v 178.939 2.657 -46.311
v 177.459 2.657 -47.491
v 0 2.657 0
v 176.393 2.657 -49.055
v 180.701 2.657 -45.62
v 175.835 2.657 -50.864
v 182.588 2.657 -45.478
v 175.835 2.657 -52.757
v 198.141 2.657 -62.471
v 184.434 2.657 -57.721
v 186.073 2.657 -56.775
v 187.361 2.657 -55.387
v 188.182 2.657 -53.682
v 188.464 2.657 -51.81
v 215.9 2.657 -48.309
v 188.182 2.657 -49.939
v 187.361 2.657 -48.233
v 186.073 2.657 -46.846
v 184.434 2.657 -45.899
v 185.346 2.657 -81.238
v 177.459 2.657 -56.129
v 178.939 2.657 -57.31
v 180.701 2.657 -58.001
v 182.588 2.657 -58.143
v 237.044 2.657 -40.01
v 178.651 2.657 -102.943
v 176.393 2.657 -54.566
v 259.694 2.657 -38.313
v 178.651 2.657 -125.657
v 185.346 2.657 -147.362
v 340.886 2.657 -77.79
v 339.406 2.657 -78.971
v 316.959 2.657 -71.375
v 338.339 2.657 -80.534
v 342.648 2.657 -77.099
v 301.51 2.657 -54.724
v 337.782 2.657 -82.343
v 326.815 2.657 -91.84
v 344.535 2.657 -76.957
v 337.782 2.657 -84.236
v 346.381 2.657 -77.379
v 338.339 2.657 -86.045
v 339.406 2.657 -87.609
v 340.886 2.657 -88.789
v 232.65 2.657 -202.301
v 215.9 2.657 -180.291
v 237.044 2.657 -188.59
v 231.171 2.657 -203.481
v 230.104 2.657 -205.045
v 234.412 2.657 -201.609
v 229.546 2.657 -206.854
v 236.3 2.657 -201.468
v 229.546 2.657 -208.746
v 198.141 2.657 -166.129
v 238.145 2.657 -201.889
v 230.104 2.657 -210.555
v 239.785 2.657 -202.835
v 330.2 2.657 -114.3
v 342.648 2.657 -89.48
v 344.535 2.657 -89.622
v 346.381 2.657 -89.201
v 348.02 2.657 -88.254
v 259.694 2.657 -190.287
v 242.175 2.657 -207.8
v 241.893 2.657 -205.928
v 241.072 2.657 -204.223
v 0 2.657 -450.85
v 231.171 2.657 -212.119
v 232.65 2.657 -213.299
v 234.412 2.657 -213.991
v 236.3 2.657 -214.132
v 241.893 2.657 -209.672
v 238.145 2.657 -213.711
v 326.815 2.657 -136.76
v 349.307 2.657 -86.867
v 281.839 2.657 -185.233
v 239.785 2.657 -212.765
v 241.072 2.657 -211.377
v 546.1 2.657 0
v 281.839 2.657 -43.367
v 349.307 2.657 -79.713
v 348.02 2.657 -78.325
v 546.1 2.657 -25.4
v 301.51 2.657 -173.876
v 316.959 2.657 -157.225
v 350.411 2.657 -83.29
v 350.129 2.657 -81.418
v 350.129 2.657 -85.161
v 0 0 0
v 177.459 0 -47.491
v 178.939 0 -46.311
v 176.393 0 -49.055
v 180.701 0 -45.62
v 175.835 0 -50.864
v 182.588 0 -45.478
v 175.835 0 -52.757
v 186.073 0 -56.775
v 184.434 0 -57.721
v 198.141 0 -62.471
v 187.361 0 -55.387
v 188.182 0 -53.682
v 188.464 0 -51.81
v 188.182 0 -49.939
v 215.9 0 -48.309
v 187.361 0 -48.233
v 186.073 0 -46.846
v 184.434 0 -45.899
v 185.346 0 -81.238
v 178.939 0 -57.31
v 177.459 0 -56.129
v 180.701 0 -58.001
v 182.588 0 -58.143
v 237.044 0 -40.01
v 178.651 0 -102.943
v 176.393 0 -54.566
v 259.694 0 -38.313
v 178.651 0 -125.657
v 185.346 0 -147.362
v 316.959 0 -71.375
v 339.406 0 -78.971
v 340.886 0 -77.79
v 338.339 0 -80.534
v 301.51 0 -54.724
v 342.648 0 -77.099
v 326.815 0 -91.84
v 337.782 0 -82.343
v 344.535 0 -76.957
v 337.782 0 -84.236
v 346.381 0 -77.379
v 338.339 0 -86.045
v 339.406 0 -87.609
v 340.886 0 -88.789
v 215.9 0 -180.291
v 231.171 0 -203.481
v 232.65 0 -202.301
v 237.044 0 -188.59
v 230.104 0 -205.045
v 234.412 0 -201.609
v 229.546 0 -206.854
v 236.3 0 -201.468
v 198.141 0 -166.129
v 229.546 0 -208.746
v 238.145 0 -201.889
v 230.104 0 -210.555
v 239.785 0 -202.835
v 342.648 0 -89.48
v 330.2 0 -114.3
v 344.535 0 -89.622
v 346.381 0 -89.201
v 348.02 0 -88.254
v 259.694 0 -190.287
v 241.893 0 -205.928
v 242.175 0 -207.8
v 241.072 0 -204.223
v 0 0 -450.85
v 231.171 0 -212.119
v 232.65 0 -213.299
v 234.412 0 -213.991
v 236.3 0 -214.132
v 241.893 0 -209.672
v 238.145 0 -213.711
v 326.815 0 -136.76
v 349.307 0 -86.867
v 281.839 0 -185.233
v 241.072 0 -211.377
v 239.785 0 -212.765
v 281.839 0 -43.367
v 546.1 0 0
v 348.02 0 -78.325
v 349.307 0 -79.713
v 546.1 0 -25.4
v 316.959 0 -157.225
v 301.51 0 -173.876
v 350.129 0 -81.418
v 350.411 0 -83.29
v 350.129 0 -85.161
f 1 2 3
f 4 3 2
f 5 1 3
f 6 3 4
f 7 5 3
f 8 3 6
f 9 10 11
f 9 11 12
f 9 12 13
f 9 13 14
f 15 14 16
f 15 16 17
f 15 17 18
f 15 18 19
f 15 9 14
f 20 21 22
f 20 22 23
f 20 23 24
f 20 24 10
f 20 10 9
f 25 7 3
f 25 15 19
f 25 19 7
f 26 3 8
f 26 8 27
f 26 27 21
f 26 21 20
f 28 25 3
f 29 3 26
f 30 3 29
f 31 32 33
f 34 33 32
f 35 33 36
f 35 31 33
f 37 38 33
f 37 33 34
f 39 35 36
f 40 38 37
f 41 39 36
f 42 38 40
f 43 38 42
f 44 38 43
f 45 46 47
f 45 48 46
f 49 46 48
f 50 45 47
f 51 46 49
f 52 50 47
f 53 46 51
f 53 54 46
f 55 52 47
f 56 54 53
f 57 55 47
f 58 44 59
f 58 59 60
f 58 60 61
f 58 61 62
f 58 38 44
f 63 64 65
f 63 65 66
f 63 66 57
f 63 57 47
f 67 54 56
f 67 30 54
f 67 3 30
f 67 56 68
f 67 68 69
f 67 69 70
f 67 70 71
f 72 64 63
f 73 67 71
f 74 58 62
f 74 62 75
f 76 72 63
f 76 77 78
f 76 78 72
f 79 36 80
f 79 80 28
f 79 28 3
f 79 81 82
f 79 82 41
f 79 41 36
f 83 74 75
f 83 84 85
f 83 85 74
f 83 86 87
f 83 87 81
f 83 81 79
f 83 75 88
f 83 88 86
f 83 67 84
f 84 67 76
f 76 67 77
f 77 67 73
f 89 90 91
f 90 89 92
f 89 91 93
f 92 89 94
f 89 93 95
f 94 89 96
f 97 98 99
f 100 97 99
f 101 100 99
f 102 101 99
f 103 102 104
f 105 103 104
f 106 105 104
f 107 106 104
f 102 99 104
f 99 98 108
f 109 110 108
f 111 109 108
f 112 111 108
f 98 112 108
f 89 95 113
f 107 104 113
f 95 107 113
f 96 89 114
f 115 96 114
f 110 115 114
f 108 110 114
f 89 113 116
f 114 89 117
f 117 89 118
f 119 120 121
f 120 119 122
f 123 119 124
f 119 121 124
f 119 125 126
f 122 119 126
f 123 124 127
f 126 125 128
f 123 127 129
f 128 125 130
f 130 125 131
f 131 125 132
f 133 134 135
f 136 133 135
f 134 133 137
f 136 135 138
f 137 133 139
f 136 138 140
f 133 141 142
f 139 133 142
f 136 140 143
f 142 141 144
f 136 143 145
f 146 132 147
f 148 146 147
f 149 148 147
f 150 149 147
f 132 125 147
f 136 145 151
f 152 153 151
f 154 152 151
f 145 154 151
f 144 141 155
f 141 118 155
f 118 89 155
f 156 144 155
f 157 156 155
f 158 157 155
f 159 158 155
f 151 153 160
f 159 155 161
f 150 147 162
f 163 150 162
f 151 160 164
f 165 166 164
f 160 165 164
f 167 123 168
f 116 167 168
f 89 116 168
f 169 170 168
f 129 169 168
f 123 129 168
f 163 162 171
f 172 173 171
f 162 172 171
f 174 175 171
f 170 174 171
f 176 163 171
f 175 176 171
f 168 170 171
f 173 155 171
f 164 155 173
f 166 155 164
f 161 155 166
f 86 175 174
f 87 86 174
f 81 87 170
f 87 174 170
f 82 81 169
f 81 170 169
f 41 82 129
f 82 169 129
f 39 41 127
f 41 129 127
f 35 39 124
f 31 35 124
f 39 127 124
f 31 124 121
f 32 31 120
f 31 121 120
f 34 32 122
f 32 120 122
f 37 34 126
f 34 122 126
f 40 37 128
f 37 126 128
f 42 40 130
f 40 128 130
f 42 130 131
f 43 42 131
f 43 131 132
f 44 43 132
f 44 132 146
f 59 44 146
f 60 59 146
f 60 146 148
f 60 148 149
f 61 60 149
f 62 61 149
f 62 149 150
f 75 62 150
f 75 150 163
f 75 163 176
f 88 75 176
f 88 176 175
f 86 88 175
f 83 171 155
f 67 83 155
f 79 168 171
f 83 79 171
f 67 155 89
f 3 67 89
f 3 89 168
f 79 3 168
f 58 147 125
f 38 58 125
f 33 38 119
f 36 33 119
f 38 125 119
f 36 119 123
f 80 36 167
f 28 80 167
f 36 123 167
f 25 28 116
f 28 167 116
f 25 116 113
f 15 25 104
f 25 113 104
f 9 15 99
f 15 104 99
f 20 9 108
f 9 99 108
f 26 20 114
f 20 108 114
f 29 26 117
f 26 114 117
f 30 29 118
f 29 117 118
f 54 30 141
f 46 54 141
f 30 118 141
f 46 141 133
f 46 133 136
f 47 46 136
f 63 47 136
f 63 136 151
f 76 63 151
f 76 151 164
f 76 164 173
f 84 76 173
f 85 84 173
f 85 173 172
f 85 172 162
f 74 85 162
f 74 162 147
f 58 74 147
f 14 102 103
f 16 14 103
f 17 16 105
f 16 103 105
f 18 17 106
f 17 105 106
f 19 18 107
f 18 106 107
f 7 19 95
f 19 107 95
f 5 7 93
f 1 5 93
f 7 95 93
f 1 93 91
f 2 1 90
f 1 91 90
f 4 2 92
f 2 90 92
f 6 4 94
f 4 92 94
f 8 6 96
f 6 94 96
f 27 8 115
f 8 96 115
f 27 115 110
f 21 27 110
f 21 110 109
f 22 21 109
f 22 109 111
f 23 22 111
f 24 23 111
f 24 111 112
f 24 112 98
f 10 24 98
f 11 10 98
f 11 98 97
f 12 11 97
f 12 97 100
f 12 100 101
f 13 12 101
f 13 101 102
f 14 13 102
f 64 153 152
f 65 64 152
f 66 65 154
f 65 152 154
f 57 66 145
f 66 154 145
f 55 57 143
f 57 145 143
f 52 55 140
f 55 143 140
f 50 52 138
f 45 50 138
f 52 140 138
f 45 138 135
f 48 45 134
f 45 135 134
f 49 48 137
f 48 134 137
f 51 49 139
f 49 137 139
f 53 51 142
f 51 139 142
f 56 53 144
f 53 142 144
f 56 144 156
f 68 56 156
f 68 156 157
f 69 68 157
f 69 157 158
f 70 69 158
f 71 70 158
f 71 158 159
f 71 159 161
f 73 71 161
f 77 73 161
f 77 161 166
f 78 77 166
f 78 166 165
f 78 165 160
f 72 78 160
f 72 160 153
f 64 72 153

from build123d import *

# Parameters (mm, degrees)
BOSS_EXTRUDE1_DEPTH = 2.65684
SKETCH2_R           = 76.2
CUT_EXTRUDE1_DEPTH  = 3.65684
SKETCH3_R           = 6.35
CUT_EXTRUDE2_DEPTH  = 3.65684


with BuildPart() as part:
    # Sketch1 → Boss-Extrude1 (new body)
    with BuildSketch(Plane(origin=(0, 0, 0), x_dir=(1, 0, 0), z_dir=(0, 1, 0))):
        Polygon((0, 450.85), (0, 0), (546.1, 0), (546.1, 25.4), align=None)
    extrude(amount=BOSS_EXTRUDE1_DEPTH)

    # Sketch2 → Cut-Extrude1 (cut, through all)
    with BuildSketch(Plane.XZ):
        with Locations((254, -114.3)):
            Circle(SKETCH2_R)
    extrude(amount=-CUT_EXTRUDE1_DEPTH, mode=Mode.SUBTRACT)

    # Sketch3 → Cut-Extrude2 (cut, through all)
    with BuildSketch(Plane.XZ):
        with Locations((344.060644326, -83.289633288)):
            Circle(SKETCH3_R)
        with Locations((235.82544319, -207.799989223)):
            Circle(SKETCH3_R)
        with Locations((182.113912484, -51.810377489)):
            Circle(SKETCH3_R)
    extrude(amount=-CUT_EXTRUDE2_DEPTH, mode=Mode.SUBTRACT)


solid = part.part
